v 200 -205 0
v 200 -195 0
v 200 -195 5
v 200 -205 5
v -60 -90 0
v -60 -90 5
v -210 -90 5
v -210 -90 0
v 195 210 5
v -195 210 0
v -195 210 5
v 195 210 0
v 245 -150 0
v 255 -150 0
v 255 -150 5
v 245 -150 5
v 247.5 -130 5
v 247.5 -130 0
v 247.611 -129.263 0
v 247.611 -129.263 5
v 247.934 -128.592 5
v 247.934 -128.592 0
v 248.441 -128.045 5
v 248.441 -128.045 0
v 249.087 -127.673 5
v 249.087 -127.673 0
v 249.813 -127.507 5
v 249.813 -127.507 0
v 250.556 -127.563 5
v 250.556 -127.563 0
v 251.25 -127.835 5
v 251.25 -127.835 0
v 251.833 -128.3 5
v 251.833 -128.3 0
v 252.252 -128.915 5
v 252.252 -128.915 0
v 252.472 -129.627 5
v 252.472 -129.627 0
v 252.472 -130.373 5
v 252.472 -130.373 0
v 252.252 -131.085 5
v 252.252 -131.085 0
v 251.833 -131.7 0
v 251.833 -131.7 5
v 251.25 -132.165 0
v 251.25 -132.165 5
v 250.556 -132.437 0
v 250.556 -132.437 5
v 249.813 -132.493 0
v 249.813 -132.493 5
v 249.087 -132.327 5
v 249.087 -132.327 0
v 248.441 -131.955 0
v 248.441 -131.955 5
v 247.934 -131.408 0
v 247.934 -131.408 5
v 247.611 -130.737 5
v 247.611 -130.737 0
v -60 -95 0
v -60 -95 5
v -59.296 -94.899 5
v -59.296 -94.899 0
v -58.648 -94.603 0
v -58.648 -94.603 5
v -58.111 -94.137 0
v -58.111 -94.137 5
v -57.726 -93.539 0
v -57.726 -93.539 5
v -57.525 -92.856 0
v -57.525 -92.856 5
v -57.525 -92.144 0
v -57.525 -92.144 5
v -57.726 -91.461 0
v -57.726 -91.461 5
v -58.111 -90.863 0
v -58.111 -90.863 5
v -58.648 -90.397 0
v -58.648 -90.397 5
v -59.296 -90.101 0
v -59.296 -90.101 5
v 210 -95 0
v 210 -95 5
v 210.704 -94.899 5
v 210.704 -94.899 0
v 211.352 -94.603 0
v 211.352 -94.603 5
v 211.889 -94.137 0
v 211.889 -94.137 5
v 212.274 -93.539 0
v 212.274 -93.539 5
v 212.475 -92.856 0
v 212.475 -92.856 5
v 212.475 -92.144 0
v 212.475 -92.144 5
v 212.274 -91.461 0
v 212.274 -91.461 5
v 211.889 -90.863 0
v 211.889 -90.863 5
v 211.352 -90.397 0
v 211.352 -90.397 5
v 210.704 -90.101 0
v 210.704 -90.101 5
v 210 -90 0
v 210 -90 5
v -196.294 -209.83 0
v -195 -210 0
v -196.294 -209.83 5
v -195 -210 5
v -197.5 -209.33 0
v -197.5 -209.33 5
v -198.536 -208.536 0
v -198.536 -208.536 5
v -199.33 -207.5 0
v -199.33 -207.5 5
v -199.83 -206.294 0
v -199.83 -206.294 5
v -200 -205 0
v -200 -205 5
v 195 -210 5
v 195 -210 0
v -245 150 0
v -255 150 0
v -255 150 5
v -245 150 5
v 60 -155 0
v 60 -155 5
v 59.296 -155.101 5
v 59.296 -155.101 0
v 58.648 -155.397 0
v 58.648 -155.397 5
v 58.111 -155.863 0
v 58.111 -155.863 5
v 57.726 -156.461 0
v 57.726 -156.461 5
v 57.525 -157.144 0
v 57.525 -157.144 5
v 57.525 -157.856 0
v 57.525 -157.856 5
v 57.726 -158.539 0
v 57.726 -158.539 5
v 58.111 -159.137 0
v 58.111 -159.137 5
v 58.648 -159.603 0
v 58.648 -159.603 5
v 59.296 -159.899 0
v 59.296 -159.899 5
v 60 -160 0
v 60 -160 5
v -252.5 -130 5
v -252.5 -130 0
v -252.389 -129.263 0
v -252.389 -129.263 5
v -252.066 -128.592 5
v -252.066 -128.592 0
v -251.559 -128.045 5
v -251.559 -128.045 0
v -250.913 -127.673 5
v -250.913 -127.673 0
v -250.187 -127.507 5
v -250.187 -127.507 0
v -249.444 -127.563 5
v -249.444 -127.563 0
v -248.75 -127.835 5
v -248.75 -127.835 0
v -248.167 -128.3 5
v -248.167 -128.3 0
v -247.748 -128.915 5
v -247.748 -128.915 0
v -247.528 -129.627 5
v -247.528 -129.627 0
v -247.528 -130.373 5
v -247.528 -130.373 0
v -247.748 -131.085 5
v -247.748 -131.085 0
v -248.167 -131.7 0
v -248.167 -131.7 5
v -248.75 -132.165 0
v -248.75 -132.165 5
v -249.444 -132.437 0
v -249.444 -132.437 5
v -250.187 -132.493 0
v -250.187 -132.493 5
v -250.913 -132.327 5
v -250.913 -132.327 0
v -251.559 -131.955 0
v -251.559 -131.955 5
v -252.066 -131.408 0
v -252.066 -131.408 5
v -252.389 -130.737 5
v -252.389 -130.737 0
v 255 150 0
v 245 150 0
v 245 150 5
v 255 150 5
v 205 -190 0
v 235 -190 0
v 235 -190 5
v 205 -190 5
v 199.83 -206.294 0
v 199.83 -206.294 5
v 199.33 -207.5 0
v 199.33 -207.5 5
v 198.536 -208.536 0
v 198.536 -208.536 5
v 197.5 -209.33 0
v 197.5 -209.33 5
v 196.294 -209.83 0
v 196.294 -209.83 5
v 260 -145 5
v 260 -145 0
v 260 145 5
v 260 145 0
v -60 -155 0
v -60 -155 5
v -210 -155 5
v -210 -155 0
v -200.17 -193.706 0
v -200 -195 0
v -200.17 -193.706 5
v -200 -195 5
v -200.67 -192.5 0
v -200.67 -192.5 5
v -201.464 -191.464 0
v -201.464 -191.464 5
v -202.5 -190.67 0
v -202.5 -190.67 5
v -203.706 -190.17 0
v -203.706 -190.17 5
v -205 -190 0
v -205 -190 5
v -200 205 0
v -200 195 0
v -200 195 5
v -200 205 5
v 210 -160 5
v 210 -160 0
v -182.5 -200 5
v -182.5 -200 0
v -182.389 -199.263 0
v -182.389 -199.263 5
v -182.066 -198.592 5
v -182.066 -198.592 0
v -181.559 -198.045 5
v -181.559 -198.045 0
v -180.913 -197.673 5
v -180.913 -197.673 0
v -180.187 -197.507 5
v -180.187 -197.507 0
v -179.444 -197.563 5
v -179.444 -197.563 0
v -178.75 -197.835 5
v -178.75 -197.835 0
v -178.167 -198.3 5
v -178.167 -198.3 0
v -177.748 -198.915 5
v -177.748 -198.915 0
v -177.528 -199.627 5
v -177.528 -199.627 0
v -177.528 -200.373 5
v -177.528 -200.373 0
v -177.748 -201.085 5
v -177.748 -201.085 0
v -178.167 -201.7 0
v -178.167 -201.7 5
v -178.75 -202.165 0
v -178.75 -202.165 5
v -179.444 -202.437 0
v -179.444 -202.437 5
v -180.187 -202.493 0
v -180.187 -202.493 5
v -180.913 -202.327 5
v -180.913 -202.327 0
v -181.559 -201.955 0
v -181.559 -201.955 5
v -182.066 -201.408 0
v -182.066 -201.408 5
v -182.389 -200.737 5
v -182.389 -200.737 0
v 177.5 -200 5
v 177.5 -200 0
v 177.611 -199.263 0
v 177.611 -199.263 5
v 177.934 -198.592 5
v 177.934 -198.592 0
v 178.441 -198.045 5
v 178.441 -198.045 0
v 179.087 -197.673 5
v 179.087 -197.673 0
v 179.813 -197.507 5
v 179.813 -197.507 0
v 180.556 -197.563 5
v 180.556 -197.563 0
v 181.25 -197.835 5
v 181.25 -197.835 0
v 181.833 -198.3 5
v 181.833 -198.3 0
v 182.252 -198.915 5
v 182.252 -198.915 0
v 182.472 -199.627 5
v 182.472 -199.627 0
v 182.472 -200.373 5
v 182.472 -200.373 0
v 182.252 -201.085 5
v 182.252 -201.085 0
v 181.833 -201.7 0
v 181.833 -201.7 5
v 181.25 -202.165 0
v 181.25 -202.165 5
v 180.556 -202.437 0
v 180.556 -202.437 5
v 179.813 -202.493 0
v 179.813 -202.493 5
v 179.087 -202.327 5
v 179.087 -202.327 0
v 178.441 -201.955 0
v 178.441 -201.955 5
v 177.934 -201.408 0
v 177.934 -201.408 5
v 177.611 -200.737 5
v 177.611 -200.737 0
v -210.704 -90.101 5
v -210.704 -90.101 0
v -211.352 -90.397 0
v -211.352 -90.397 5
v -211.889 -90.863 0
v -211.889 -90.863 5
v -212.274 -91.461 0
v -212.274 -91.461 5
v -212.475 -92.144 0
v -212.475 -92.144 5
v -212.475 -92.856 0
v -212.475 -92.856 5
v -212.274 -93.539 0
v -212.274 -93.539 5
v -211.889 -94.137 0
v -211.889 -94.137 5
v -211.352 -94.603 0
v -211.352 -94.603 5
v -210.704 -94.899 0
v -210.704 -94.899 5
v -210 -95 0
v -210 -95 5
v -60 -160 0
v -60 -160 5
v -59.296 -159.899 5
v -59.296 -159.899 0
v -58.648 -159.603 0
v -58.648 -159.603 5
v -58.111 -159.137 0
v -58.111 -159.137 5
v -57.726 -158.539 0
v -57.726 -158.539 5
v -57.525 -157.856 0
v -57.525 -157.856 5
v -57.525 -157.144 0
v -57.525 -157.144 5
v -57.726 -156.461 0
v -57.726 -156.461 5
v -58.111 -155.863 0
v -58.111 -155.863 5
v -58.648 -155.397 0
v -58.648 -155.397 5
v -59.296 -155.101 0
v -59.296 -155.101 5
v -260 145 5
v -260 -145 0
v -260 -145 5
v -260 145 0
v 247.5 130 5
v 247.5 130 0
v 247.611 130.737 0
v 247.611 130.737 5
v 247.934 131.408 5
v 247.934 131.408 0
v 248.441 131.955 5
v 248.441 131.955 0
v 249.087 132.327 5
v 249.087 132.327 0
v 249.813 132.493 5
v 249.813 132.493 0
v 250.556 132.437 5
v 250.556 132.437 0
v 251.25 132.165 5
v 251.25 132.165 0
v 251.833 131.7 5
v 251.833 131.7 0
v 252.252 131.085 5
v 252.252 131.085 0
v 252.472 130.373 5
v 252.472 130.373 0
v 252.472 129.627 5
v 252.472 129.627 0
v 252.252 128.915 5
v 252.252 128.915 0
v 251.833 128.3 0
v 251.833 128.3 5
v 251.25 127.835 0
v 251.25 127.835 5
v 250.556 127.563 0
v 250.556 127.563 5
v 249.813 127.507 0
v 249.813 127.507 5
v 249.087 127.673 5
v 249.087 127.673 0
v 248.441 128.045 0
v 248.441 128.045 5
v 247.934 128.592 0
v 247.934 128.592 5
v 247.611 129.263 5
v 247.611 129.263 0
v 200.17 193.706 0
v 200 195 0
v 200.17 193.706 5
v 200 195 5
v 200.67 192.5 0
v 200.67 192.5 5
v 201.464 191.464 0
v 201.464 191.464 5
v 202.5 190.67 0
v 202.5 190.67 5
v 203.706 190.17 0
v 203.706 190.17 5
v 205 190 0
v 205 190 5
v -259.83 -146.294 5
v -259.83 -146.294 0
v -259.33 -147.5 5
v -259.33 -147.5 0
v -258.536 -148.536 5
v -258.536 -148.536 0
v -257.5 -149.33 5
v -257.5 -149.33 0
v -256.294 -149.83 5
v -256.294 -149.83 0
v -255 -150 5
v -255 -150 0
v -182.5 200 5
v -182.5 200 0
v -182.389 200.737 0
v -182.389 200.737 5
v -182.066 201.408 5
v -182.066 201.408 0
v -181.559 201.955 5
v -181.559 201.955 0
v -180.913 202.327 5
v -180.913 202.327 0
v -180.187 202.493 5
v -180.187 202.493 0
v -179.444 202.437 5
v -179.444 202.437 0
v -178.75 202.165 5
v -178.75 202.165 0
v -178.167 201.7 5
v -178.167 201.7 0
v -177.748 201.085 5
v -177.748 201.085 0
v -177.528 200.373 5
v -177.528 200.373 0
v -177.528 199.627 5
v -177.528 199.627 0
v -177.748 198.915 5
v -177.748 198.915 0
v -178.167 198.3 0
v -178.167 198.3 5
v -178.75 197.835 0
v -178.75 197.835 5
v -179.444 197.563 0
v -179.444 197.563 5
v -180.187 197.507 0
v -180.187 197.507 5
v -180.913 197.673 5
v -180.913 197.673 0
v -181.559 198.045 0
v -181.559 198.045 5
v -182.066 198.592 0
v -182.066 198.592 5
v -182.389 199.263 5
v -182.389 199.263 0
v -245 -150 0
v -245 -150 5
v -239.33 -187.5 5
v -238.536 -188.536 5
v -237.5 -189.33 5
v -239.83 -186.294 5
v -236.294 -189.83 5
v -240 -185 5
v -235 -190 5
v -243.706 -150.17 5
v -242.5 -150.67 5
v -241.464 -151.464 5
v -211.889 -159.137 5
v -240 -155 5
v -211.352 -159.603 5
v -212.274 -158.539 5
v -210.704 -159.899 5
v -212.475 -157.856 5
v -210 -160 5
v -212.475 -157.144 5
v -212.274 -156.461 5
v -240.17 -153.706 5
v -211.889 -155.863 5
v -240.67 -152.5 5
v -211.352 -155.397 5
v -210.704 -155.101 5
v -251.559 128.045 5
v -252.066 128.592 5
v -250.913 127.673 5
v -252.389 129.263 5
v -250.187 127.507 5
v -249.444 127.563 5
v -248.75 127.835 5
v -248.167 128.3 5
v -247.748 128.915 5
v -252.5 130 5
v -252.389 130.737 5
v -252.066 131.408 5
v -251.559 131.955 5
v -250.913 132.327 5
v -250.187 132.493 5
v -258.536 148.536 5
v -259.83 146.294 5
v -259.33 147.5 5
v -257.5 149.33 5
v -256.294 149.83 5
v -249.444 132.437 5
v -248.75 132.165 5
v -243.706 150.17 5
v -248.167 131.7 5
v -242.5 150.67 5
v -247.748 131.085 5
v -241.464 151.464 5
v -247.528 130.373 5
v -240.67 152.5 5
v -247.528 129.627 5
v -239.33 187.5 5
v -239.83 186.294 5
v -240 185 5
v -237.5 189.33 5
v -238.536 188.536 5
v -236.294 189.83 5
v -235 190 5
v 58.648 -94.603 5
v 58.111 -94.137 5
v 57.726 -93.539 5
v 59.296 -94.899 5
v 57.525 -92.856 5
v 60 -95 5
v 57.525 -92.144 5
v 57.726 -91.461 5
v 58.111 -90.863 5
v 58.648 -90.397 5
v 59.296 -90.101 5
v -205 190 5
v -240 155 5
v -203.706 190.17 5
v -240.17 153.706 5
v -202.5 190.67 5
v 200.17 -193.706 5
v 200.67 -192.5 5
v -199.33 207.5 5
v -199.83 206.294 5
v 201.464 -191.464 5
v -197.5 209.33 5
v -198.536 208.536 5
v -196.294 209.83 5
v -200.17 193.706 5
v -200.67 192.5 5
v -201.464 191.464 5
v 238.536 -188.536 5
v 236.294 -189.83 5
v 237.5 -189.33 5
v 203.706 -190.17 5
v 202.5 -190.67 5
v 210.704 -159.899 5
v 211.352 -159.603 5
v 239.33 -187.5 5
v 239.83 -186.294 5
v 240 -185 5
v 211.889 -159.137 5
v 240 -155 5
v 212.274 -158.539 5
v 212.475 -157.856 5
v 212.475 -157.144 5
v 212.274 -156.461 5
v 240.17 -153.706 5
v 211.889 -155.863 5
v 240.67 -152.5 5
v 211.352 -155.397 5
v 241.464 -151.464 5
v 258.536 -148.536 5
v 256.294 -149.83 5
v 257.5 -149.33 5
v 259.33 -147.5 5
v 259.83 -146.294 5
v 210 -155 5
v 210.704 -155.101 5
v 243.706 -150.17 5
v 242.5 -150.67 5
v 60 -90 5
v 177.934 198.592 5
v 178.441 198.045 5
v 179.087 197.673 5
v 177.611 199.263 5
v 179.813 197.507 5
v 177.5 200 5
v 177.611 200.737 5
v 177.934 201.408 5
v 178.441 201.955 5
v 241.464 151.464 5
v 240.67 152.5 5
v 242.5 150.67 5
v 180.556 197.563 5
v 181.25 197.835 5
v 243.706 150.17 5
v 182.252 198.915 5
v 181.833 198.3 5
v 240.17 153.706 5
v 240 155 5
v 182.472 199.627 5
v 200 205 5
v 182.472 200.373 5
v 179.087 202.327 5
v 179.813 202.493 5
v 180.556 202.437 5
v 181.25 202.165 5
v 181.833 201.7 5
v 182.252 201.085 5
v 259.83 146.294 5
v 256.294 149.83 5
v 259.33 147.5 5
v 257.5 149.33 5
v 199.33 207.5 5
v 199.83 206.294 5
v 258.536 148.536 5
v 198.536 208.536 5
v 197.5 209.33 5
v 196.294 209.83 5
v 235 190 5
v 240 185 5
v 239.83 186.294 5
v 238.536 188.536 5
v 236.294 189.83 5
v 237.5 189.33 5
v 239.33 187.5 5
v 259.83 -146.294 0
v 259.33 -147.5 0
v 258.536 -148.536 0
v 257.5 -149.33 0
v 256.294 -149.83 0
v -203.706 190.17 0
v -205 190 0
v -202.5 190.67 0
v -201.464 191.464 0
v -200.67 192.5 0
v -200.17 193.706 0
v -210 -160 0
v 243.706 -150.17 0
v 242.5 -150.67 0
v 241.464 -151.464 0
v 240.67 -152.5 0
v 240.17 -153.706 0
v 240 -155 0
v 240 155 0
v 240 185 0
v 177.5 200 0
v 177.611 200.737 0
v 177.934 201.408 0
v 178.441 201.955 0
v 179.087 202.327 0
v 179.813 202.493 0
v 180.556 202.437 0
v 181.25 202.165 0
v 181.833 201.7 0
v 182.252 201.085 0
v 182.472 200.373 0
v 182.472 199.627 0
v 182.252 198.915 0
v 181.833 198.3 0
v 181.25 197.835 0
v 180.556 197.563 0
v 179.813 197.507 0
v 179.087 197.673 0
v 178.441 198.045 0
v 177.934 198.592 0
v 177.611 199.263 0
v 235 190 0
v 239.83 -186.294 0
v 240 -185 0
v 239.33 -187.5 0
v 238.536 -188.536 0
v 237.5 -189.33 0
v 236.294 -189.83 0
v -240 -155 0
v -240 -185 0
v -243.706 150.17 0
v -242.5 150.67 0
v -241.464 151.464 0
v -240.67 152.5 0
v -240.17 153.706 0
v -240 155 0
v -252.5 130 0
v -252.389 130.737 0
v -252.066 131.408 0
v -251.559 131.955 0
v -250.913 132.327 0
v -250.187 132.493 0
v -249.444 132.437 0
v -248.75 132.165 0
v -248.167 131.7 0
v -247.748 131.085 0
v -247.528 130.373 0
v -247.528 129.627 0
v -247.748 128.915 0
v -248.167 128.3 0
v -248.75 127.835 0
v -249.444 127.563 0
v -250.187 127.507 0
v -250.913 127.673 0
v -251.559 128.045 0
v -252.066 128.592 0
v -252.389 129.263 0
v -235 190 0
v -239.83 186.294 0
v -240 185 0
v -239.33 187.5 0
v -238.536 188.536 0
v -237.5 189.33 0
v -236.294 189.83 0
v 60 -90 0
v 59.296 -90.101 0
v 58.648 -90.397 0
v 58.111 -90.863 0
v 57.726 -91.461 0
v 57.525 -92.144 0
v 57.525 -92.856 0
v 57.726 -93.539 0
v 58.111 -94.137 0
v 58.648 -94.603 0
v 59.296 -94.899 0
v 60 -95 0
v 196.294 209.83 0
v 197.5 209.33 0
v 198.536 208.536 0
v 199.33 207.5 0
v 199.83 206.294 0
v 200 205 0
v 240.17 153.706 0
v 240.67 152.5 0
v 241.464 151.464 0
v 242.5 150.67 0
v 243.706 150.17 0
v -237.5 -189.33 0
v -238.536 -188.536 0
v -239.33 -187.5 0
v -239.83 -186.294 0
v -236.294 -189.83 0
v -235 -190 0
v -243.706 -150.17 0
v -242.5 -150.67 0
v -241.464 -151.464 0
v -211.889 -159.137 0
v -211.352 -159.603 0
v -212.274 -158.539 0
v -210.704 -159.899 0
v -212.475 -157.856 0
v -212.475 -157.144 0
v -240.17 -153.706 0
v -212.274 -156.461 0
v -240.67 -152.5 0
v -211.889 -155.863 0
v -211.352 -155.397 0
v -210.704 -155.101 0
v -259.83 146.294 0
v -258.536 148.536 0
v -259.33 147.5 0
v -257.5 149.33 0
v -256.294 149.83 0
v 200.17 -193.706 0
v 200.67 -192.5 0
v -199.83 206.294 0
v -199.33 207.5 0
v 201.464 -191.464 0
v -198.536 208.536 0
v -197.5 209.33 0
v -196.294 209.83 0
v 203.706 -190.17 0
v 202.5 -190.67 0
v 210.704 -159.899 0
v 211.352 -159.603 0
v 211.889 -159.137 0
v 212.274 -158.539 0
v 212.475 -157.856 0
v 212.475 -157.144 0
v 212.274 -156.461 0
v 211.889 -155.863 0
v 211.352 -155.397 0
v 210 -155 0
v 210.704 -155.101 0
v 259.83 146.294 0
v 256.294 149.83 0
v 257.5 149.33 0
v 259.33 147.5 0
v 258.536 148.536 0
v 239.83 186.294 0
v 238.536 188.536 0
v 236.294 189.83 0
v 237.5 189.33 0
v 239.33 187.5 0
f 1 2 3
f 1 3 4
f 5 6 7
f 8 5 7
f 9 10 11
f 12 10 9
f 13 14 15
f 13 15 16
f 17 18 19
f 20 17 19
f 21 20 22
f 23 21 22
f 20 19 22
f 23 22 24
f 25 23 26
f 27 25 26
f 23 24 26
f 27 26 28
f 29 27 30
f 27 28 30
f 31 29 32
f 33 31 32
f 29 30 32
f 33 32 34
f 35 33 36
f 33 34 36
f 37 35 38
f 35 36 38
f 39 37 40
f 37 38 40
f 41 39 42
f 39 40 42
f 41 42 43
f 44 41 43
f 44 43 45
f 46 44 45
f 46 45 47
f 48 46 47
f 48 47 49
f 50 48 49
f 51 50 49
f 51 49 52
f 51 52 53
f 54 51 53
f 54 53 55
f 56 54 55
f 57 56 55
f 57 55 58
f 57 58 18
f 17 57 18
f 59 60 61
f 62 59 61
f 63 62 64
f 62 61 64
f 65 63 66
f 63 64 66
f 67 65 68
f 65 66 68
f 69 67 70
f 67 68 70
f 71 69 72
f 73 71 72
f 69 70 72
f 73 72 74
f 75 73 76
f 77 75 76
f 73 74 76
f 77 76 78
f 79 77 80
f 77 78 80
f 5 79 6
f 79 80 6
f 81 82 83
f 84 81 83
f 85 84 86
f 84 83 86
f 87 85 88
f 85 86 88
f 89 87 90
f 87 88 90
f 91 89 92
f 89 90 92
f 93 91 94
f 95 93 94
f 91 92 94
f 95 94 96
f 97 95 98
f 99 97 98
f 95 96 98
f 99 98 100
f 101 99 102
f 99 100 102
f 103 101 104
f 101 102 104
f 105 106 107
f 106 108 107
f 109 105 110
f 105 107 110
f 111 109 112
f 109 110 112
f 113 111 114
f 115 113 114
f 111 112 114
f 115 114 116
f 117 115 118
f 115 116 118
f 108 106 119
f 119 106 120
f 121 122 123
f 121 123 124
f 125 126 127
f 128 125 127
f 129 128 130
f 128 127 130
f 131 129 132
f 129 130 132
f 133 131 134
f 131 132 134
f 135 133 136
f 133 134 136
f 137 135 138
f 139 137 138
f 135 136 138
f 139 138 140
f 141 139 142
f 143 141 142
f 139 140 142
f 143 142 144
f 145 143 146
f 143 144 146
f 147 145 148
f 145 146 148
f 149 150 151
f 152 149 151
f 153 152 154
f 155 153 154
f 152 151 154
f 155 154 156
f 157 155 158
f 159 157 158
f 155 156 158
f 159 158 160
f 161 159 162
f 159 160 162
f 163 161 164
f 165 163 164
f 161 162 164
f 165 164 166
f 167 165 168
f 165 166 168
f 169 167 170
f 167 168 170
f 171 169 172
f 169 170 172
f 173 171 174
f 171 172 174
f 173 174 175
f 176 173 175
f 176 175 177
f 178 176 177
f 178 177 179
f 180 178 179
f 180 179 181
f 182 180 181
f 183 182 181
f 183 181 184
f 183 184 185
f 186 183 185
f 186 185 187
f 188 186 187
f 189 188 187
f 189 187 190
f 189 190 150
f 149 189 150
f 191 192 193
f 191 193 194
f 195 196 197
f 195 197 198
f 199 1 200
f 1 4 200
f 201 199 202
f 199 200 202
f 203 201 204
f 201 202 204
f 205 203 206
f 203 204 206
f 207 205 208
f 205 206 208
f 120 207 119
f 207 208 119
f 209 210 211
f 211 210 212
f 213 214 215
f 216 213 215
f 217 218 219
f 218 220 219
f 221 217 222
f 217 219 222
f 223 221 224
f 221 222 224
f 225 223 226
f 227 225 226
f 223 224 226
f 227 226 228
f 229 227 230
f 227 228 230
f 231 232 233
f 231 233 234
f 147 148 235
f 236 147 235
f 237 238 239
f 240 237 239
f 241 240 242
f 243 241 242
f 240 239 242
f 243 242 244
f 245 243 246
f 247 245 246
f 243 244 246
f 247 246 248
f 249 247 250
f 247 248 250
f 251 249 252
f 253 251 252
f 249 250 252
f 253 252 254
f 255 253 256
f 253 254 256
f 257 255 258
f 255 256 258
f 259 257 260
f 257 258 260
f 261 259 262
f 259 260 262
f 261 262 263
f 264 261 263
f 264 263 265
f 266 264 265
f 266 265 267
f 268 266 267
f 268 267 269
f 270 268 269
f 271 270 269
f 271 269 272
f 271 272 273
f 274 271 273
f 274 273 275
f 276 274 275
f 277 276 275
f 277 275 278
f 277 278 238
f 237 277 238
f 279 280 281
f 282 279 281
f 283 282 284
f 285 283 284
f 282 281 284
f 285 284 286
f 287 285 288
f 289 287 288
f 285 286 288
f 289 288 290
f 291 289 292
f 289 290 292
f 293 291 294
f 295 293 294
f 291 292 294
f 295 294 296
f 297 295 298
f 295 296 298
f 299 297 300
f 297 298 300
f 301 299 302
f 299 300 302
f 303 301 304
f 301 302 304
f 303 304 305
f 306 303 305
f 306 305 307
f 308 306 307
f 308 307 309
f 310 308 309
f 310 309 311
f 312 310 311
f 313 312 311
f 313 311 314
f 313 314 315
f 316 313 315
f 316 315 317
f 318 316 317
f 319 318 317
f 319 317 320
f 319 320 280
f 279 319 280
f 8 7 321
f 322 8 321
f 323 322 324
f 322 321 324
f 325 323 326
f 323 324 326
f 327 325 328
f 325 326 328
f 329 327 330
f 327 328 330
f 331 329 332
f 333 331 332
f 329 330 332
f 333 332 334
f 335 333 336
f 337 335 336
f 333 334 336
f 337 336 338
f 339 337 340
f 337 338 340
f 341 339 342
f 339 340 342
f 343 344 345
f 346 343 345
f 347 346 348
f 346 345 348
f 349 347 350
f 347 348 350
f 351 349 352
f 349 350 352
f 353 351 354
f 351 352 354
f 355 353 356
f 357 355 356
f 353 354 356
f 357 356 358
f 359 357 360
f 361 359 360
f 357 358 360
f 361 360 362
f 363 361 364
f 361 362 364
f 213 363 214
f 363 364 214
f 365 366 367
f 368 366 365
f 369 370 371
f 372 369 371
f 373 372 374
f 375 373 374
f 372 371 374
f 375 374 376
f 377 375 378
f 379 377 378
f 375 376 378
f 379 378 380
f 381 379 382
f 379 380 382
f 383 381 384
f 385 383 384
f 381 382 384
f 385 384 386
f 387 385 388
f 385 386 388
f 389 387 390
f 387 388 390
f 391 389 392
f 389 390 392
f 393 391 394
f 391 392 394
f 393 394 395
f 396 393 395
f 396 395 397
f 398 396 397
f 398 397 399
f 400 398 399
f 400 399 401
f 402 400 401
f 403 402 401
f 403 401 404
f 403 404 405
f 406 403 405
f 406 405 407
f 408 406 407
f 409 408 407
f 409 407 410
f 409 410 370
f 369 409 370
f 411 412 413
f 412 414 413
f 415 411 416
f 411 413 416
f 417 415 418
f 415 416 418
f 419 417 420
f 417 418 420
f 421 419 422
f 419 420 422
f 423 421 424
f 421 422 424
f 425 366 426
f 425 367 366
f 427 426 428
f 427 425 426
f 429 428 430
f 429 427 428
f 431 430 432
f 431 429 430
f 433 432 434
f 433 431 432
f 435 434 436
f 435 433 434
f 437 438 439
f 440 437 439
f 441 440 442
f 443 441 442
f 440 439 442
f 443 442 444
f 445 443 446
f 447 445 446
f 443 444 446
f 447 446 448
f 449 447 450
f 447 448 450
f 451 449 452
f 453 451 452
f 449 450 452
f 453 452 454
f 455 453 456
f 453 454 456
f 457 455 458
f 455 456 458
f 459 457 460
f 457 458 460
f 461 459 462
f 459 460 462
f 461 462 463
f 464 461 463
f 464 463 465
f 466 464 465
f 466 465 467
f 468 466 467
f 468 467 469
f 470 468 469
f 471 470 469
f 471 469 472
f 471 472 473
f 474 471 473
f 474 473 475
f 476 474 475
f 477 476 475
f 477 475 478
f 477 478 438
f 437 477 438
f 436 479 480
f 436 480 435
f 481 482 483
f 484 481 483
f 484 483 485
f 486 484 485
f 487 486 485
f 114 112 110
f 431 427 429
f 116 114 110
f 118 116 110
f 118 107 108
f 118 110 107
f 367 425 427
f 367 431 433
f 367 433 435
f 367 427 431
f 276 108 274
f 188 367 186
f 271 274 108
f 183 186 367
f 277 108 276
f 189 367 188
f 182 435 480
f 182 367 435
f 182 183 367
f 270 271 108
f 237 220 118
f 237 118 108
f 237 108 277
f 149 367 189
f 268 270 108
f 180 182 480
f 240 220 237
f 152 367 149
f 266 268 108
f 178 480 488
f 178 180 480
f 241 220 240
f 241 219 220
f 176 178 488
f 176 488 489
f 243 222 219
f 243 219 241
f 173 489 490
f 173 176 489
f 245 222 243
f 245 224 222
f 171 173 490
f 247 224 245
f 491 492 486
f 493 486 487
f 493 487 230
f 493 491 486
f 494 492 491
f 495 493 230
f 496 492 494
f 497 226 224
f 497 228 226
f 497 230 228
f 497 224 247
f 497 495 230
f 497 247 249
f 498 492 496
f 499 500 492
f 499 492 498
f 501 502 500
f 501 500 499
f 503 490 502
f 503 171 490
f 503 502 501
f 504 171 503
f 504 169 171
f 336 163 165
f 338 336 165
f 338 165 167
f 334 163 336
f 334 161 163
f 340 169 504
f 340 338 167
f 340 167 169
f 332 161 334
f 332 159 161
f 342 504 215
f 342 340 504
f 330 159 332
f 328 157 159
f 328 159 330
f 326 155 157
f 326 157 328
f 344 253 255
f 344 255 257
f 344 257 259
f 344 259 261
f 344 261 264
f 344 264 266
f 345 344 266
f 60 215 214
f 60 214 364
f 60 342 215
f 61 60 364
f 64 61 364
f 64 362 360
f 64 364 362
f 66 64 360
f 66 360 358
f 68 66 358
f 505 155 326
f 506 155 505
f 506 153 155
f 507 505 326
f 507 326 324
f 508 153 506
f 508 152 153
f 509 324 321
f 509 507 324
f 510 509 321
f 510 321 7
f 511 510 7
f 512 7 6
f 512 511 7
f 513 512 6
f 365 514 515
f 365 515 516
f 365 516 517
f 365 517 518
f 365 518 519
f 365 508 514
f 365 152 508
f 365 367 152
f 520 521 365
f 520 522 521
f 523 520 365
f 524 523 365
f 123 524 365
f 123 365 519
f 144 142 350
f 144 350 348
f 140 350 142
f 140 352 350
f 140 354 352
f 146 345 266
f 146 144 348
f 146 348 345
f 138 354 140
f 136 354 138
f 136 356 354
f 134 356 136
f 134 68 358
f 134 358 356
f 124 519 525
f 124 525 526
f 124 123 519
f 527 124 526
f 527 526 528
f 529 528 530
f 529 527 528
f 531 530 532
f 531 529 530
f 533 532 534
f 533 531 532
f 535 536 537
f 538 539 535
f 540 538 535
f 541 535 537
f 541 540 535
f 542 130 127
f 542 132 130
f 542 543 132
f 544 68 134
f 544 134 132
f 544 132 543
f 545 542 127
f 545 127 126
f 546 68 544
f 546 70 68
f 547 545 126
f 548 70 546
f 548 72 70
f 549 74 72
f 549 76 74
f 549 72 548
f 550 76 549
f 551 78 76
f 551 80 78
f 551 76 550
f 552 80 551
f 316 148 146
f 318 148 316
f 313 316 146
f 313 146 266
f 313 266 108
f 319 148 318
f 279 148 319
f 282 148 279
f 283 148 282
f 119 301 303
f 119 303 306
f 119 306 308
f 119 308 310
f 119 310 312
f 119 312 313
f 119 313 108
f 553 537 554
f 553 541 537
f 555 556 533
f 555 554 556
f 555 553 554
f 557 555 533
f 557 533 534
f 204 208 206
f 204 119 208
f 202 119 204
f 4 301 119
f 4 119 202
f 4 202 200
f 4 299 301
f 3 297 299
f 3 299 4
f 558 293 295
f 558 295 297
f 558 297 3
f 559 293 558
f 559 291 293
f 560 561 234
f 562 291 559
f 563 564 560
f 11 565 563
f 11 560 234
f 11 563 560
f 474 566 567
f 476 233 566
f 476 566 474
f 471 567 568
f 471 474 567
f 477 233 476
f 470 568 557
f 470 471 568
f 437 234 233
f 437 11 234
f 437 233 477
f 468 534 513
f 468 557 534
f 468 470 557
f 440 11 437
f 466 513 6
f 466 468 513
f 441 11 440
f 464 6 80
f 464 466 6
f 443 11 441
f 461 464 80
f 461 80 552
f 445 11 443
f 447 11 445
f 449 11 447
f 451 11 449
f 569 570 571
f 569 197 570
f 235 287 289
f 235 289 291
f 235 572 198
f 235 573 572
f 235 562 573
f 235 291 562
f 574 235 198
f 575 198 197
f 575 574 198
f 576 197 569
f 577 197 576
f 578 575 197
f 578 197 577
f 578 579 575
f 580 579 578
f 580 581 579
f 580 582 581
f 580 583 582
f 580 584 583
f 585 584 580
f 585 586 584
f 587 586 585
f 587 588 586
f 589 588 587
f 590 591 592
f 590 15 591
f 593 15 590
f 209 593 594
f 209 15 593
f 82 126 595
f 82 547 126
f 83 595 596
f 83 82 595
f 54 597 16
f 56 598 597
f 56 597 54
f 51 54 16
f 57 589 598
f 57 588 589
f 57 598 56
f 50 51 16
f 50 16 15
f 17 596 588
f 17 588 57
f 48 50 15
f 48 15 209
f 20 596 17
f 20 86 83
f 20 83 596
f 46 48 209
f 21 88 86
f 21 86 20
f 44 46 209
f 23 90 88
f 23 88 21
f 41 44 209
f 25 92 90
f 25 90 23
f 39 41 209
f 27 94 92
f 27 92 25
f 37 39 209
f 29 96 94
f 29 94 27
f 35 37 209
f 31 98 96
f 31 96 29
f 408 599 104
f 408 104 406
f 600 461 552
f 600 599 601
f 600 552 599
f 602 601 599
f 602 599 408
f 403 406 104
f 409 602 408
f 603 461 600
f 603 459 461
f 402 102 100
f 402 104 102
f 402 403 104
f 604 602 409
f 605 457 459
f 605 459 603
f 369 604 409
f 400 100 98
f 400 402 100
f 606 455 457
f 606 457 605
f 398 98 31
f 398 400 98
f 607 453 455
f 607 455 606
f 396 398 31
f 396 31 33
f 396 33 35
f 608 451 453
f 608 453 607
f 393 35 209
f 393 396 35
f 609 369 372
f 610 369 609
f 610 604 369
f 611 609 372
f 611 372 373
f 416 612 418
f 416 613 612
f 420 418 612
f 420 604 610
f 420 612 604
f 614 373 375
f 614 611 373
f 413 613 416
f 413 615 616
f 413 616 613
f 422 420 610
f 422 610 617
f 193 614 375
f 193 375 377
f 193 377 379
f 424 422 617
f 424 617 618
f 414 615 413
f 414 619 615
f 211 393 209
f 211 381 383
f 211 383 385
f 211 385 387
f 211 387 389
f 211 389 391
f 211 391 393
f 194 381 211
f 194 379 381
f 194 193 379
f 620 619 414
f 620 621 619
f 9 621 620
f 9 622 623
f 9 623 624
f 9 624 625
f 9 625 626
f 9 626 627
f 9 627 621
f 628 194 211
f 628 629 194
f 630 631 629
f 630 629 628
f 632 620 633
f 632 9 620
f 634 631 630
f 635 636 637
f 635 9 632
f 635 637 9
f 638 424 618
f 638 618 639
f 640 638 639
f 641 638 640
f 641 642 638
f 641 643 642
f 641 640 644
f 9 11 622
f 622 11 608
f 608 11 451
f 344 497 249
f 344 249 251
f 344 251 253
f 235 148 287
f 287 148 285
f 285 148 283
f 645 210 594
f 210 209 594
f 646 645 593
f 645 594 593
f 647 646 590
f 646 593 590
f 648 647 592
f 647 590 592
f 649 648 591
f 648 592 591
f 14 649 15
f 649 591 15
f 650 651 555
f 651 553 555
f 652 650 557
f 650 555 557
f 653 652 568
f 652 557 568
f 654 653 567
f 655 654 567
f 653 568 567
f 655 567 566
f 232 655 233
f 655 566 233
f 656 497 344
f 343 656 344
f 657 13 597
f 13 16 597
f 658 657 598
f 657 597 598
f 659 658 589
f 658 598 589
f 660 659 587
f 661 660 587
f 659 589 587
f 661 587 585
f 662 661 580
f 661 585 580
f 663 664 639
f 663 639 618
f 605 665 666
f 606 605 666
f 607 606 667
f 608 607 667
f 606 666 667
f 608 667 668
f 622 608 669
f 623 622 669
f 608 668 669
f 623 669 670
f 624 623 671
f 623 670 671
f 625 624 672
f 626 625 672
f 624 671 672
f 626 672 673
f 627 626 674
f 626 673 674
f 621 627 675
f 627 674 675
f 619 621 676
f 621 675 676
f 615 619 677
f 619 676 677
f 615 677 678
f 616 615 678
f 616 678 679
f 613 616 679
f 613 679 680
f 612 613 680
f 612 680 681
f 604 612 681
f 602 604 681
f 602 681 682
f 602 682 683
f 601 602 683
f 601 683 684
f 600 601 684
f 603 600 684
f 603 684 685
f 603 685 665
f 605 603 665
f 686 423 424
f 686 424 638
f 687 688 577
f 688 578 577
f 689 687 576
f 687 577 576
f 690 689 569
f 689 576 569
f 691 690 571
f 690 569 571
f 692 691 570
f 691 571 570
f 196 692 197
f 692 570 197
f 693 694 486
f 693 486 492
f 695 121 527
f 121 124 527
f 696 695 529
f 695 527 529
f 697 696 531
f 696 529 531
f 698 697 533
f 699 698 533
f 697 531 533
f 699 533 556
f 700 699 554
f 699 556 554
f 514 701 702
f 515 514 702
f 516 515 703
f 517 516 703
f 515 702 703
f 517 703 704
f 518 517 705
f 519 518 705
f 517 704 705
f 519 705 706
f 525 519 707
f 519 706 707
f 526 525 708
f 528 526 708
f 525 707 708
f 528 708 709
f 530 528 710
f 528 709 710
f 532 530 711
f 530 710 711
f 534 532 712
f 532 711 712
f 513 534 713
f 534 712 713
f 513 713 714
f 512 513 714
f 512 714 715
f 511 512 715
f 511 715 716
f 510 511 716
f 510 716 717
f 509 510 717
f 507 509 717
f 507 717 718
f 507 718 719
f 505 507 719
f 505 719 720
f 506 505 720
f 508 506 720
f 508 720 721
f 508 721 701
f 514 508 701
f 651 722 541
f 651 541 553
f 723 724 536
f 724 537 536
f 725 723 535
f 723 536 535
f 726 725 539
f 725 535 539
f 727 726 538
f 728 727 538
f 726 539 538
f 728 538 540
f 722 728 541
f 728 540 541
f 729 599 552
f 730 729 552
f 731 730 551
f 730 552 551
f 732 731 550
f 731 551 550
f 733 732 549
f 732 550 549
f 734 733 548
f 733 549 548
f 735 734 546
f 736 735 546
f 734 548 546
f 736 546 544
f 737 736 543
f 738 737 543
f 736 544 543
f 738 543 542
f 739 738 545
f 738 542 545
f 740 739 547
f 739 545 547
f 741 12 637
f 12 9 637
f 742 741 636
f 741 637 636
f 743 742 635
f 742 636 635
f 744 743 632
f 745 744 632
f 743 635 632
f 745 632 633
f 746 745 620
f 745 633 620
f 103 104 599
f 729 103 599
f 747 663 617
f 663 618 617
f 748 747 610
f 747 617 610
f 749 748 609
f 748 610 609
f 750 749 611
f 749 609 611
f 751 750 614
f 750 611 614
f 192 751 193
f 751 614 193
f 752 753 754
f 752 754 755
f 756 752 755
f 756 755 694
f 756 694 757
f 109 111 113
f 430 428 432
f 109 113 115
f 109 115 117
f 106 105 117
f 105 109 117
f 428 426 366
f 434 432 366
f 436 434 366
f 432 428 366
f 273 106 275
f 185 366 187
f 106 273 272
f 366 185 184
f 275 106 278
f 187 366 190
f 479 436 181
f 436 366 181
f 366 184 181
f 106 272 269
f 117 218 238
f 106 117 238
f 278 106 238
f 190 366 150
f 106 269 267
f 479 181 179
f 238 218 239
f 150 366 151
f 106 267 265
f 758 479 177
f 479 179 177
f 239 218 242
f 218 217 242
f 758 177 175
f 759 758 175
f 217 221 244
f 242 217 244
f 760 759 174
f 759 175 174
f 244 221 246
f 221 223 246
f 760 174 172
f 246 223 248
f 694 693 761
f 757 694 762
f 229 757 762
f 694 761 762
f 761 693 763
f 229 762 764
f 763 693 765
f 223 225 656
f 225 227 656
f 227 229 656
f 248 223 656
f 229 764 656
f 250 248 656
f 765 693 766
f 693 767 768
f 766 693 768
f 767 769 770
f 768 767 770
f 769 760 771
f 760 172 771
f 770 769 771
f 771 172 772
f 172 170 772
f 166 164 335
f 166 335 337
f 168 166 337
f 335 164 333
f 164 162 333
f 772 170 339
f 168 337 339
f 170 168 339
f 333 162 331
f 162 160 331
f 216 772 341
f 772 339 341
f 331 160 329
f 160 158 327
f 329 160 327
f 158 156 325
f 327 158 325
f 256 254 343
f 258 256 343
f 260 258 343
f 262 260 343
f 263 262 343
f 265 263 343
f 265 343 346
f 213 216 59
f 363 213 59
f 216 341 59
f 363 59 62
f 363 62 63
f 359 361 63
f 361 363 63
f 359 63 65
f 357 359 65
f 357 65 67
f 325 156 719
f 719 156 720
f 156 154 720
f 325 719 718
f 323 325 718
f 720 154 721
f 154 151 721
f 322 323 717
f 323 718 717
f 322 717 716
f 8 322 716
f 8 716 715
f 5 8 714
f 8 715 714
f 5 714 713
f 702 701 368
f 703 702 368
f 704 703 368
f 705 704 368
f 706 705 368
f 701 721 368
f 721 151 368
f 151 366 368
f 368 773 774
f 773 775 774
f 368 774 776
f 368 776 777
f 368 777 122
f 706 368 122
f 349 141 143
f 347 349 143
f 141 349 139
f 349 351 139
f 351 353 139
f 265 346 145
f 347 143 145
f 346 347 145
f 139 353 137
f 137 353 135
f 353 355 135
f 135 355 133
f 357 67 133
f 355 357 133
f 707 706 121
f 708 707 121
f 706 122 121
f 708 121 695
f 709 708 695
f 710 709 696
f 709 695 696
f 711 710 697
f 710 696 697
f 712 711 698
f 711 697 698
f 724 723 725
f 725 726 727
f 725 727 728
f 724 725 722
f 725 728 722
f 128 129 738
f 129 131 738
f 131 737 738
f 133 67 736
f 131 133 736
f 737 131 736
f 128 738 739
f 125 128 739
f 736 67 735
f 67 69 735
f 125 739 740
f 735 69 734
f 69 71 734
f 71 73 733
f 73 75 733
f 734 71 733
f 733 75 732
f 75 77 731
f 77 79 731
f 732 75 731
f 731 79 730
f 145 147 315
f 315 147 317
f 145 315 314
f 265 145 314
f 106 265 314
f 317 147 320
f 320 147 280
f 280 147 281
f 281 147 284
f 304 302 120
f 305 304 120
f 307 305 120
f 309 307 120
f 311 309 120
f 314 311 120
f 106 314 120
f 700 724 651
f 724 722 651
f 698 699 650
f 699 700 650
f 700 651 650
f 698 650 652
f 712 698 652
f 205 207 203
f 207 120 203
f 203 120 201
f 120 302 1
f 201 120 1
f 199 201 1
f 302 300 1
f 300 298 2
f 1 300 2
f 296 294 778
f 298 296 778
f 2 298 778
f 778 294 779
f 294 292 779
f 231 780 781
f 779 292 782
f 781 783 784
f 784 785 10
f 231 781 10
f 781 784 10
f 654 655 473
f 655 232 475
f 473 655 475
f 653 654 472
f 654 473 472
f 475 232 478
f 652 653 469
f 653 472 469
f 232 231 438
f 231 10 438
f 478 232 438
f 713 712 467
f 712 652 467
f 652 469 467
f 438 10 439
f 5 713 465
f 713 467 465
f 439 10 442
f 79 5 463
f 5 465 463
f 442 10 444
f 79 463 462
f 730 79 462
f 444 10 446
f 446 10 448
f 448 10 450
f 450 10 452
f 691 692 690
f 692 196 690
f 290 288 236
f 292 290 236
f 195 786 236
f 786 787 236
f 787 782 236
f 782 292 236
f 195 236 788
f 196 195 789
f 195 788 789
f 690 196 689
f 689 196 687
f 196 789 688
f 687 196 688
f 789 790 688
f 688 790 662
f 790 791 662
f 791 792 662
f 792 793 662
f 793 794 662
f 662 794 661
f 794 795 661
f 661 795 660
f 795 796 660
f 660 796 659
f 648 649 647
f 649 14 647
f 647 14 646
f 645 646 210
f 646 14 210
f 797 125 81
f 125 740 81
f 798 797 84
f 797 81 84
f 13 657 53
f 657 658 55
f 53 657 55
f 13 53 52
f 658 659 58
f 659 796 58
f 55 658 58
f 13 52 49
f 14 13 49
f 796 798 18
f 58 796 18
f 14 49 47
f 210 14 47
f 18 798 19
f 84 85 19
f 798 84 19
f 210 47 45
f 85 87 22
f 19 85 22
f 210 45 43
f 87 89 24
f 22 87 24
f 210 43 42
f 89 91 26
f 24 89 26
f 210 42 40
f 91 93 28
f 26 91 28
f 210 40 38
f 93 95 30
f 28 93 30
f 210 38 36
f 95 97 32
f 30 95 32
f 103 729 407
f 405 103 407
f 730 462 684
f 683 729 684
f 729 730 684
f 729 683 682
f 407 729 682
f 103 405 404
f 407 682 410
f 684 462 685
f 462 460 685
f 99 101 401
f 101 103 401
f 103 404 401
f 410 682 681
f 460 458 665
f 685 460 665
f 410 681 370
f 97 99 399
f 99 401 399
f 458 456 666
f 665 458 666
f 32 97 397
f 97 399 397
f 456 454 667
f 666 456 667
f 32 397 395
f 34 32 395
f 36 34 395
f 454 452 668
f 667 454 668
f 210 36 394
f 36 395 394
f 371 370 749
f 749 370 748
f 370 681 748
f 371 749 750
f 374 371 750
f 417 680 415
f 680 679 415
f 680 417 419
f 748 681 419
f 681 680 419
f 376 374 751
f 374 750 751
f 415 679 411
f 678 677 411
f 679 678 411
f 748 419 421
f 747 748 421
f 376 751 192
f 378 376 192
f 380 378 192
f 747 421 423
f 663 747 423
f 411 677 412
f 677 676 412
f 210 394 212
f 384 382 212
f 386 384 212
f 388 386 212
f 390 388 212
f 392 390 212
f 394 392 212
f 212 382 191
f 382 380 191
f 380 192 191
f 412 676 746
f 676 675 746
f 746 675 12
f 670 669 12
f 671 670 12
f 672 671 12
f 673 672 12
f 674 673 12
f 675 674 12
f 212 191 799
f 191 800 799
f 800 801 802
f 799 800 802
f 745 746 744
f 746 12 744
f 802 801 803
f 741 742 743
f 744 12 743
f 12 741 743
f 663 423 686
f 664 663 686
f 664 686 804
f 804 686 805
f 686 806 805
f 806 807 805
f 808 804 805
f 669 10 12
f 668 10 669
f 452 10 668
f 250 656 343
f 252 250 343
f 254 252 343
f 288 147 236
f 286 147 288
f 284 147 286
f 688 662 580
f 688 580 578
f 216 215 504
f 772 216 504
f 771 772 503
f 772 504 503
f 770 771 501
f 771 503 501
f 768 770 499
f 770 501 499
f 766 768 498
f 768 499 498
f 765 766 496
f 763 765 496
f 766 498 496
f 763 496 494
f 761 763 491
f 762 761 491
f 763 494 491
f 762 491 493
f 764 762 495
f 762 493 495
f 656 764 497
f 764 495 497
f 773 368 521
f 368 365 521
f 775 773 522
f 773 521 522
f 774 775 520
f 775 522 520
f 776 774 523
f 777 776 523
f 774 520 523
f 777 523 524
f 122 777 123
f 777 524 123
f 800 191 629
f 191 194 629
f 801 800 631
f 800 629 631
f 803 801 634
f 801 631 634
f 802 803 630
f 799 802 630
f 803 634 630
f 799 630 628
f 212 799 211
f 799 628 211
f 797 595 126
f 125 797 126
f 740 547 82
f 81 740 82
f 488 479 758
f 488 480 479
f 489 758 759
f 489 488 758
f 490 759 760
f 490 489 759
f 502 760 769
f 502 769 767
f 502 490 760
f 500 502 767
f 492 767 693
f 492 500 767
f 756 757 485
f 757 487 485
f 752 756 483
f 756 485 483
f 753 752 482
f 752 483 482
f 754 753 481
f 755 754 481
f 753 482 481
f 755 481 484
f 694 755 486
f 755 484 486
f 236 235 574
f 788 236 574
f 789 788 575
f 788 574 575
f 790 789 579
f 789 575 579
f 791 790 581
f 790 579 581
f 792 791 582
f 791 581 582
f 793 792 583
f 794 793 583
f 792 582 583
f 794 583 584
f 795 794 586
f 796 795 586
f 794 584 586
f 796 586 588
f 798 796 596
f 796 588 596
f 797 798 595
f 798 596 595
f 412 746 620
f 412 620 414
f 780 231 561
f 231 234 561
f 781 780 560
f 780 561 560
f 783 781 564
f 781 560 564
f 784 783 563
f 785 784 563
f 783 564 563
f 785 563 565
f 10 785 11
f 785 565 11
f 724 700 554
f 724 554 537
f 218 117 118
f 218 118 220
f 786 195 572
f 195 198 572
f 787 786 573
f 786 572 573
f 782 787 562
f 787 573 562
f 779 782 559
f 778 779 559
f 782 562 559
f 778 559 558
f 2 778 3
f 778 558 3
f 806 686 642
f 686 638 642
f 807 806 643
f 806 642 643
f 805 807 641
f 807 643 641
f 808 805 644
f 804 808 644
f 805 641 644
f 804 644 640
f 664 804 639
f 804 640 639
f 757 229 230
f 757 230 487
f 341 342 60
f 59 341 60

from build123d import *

# Parameters (mm, degrees)
SKETCH_1_W          = 520
SKETCH_1_H          = 420
EXTRUDE_2_DEPTH     = 5
SKETCH_2_R          = 2.5
CUT_EXTRUDE_1_DEPTH = 335.252898267
FILLET_1_R          = 5
CUT_EXTRUDE_2_DEPTH = 10


with BuildPart() as part:
    # 草图1 → 凸台-拉伸2 (new body)
    with BuildSketch(Plane.XY):
        Rectangle(SKETCH_1_W, SKETCH_1_H)
    extrude(amount=EXTRUDE_2_DEPTH)

    # 草图2 → 切除-拉伸1 (cut, through all)
    with BuildSketch(Plane(origin=(0, 0, 0), x_dir=(-1, 0, 0), z_dir=(0, 0, -1))):
        with Locations((-180, 200)):
            Circle(SKETCH_2_R)
        with Locations((-250, 130)):
            Circle(SKETCH_2_R)
        with Locations((-250, -130)):
            Circle(SKETCH_2_R)
        with Locations((-180, -200)):
            Circle(SKETCH_2_R)
        with Locations((180, -200)):
            Circle(SKETCH_2_R)
        with Locations((250, -130)):
            Circle(SKETCH_2_R)
        with Locations((250, 130)):
            Circle(SKETCH_2_R)
        with Locations((180, 200)):
            Circle(SKETCH_2_R)
        Polygon((240, -190), (240, -150), (260, -150), (260, -210), (200, -210), (200, -190), align=None)
        Polygon((240, 190), (200, 190), (200, 210), (260, 210), (260, 150), (240, 150), align=None)
        Polygon((-240, 190), (-240, 150), (-260, 150), (-260, 210), (-200, 210), (-200, 190), align=None)
        Polygon((-240, -190), (-200, -190), (-200, -210), (-260, -210), (-260, -150), (-240, -150), align=None)
    extrude(amount=-CUT_EXTRUDE_1_DEPTH, mode=Mode.SUBTRACT)

    # 圆角1
    fillet_1_edges = [part.edges().sort_by_distance(p)[0] for p in [
        (-240, 150, 2.5),
        (-240, 190, 2.5),
        (-200, 190, 2.5),
        (-200, 210, 2.5),
        (-260, 150, 2.5),
        (-200, -190, 2.5),
        (-240, -190, 2.5),
        (-240, -150, 2.5),
        (-260, -150, 2.5),
        (-200, -210, 2.5),
        (260, -150, 2.5),
        (240, -150, 2.5),
        (240, -190, 2.5),
        (200, -190, 2.5),
        (200, -210, 2.5),
        (200, 210, 2.5),
        (200, 190, 2.5),
        (240, 190, 2.5),
        (240, 150, 2.5),
        (260, 150, 2.5),
    ]]
    fillet(fillet_1_edges, radius=FILLET_1_R)

    # 草图3 → 切除-拉伸2 (cut)
    with BuildSketch(Plane.XY.offset(5)):
        with BuildLine():
            Line((-210, -95), (-60, -95))
            ThreePointArc((-60, -95), (-57.5, -92.5), (-60, -90))
            Line((-60, -90), (-210, -90))
            ThreePointArc((-210, -90), (-212.5, -92.5), (-210, -95))
        make_face()
        with BuildLine():
            Line((-210, -160), (-60, -160))
            ThreePointArc((-60, -160), (-57.5, -157.5), (-60, -155))
            Line((-60, -155), (-210, -155))
            ThreePointArc((-210, -155), (-212.5, -157.5), (-210, -160))
        make_face()
        with BuildLine():
            Line((60, -160), (210, -160))
            ThreePointArc((210, -160), (212.5, -157.5), (210, -155))
            Line((210, -155), (60, -155))
            ThreePointArc((60, -155), (57.5, -157.5), (60, -160))
        make_face()
        with BuildLine():
            Line((60, -95), (210, -95))
            ThreePointArc((210, -95), (212.5, -92.5), (210, -90))
            Line((210, -90), (60, -90))
            ThreePointArc((60, -90), (57.5, -92.5), (60, -95))
        make_face()
    extrude(amount=-CUT_EXTRUDE_2_DEPTH, mode=Mode.SUBTRACT)


solid = part.part
